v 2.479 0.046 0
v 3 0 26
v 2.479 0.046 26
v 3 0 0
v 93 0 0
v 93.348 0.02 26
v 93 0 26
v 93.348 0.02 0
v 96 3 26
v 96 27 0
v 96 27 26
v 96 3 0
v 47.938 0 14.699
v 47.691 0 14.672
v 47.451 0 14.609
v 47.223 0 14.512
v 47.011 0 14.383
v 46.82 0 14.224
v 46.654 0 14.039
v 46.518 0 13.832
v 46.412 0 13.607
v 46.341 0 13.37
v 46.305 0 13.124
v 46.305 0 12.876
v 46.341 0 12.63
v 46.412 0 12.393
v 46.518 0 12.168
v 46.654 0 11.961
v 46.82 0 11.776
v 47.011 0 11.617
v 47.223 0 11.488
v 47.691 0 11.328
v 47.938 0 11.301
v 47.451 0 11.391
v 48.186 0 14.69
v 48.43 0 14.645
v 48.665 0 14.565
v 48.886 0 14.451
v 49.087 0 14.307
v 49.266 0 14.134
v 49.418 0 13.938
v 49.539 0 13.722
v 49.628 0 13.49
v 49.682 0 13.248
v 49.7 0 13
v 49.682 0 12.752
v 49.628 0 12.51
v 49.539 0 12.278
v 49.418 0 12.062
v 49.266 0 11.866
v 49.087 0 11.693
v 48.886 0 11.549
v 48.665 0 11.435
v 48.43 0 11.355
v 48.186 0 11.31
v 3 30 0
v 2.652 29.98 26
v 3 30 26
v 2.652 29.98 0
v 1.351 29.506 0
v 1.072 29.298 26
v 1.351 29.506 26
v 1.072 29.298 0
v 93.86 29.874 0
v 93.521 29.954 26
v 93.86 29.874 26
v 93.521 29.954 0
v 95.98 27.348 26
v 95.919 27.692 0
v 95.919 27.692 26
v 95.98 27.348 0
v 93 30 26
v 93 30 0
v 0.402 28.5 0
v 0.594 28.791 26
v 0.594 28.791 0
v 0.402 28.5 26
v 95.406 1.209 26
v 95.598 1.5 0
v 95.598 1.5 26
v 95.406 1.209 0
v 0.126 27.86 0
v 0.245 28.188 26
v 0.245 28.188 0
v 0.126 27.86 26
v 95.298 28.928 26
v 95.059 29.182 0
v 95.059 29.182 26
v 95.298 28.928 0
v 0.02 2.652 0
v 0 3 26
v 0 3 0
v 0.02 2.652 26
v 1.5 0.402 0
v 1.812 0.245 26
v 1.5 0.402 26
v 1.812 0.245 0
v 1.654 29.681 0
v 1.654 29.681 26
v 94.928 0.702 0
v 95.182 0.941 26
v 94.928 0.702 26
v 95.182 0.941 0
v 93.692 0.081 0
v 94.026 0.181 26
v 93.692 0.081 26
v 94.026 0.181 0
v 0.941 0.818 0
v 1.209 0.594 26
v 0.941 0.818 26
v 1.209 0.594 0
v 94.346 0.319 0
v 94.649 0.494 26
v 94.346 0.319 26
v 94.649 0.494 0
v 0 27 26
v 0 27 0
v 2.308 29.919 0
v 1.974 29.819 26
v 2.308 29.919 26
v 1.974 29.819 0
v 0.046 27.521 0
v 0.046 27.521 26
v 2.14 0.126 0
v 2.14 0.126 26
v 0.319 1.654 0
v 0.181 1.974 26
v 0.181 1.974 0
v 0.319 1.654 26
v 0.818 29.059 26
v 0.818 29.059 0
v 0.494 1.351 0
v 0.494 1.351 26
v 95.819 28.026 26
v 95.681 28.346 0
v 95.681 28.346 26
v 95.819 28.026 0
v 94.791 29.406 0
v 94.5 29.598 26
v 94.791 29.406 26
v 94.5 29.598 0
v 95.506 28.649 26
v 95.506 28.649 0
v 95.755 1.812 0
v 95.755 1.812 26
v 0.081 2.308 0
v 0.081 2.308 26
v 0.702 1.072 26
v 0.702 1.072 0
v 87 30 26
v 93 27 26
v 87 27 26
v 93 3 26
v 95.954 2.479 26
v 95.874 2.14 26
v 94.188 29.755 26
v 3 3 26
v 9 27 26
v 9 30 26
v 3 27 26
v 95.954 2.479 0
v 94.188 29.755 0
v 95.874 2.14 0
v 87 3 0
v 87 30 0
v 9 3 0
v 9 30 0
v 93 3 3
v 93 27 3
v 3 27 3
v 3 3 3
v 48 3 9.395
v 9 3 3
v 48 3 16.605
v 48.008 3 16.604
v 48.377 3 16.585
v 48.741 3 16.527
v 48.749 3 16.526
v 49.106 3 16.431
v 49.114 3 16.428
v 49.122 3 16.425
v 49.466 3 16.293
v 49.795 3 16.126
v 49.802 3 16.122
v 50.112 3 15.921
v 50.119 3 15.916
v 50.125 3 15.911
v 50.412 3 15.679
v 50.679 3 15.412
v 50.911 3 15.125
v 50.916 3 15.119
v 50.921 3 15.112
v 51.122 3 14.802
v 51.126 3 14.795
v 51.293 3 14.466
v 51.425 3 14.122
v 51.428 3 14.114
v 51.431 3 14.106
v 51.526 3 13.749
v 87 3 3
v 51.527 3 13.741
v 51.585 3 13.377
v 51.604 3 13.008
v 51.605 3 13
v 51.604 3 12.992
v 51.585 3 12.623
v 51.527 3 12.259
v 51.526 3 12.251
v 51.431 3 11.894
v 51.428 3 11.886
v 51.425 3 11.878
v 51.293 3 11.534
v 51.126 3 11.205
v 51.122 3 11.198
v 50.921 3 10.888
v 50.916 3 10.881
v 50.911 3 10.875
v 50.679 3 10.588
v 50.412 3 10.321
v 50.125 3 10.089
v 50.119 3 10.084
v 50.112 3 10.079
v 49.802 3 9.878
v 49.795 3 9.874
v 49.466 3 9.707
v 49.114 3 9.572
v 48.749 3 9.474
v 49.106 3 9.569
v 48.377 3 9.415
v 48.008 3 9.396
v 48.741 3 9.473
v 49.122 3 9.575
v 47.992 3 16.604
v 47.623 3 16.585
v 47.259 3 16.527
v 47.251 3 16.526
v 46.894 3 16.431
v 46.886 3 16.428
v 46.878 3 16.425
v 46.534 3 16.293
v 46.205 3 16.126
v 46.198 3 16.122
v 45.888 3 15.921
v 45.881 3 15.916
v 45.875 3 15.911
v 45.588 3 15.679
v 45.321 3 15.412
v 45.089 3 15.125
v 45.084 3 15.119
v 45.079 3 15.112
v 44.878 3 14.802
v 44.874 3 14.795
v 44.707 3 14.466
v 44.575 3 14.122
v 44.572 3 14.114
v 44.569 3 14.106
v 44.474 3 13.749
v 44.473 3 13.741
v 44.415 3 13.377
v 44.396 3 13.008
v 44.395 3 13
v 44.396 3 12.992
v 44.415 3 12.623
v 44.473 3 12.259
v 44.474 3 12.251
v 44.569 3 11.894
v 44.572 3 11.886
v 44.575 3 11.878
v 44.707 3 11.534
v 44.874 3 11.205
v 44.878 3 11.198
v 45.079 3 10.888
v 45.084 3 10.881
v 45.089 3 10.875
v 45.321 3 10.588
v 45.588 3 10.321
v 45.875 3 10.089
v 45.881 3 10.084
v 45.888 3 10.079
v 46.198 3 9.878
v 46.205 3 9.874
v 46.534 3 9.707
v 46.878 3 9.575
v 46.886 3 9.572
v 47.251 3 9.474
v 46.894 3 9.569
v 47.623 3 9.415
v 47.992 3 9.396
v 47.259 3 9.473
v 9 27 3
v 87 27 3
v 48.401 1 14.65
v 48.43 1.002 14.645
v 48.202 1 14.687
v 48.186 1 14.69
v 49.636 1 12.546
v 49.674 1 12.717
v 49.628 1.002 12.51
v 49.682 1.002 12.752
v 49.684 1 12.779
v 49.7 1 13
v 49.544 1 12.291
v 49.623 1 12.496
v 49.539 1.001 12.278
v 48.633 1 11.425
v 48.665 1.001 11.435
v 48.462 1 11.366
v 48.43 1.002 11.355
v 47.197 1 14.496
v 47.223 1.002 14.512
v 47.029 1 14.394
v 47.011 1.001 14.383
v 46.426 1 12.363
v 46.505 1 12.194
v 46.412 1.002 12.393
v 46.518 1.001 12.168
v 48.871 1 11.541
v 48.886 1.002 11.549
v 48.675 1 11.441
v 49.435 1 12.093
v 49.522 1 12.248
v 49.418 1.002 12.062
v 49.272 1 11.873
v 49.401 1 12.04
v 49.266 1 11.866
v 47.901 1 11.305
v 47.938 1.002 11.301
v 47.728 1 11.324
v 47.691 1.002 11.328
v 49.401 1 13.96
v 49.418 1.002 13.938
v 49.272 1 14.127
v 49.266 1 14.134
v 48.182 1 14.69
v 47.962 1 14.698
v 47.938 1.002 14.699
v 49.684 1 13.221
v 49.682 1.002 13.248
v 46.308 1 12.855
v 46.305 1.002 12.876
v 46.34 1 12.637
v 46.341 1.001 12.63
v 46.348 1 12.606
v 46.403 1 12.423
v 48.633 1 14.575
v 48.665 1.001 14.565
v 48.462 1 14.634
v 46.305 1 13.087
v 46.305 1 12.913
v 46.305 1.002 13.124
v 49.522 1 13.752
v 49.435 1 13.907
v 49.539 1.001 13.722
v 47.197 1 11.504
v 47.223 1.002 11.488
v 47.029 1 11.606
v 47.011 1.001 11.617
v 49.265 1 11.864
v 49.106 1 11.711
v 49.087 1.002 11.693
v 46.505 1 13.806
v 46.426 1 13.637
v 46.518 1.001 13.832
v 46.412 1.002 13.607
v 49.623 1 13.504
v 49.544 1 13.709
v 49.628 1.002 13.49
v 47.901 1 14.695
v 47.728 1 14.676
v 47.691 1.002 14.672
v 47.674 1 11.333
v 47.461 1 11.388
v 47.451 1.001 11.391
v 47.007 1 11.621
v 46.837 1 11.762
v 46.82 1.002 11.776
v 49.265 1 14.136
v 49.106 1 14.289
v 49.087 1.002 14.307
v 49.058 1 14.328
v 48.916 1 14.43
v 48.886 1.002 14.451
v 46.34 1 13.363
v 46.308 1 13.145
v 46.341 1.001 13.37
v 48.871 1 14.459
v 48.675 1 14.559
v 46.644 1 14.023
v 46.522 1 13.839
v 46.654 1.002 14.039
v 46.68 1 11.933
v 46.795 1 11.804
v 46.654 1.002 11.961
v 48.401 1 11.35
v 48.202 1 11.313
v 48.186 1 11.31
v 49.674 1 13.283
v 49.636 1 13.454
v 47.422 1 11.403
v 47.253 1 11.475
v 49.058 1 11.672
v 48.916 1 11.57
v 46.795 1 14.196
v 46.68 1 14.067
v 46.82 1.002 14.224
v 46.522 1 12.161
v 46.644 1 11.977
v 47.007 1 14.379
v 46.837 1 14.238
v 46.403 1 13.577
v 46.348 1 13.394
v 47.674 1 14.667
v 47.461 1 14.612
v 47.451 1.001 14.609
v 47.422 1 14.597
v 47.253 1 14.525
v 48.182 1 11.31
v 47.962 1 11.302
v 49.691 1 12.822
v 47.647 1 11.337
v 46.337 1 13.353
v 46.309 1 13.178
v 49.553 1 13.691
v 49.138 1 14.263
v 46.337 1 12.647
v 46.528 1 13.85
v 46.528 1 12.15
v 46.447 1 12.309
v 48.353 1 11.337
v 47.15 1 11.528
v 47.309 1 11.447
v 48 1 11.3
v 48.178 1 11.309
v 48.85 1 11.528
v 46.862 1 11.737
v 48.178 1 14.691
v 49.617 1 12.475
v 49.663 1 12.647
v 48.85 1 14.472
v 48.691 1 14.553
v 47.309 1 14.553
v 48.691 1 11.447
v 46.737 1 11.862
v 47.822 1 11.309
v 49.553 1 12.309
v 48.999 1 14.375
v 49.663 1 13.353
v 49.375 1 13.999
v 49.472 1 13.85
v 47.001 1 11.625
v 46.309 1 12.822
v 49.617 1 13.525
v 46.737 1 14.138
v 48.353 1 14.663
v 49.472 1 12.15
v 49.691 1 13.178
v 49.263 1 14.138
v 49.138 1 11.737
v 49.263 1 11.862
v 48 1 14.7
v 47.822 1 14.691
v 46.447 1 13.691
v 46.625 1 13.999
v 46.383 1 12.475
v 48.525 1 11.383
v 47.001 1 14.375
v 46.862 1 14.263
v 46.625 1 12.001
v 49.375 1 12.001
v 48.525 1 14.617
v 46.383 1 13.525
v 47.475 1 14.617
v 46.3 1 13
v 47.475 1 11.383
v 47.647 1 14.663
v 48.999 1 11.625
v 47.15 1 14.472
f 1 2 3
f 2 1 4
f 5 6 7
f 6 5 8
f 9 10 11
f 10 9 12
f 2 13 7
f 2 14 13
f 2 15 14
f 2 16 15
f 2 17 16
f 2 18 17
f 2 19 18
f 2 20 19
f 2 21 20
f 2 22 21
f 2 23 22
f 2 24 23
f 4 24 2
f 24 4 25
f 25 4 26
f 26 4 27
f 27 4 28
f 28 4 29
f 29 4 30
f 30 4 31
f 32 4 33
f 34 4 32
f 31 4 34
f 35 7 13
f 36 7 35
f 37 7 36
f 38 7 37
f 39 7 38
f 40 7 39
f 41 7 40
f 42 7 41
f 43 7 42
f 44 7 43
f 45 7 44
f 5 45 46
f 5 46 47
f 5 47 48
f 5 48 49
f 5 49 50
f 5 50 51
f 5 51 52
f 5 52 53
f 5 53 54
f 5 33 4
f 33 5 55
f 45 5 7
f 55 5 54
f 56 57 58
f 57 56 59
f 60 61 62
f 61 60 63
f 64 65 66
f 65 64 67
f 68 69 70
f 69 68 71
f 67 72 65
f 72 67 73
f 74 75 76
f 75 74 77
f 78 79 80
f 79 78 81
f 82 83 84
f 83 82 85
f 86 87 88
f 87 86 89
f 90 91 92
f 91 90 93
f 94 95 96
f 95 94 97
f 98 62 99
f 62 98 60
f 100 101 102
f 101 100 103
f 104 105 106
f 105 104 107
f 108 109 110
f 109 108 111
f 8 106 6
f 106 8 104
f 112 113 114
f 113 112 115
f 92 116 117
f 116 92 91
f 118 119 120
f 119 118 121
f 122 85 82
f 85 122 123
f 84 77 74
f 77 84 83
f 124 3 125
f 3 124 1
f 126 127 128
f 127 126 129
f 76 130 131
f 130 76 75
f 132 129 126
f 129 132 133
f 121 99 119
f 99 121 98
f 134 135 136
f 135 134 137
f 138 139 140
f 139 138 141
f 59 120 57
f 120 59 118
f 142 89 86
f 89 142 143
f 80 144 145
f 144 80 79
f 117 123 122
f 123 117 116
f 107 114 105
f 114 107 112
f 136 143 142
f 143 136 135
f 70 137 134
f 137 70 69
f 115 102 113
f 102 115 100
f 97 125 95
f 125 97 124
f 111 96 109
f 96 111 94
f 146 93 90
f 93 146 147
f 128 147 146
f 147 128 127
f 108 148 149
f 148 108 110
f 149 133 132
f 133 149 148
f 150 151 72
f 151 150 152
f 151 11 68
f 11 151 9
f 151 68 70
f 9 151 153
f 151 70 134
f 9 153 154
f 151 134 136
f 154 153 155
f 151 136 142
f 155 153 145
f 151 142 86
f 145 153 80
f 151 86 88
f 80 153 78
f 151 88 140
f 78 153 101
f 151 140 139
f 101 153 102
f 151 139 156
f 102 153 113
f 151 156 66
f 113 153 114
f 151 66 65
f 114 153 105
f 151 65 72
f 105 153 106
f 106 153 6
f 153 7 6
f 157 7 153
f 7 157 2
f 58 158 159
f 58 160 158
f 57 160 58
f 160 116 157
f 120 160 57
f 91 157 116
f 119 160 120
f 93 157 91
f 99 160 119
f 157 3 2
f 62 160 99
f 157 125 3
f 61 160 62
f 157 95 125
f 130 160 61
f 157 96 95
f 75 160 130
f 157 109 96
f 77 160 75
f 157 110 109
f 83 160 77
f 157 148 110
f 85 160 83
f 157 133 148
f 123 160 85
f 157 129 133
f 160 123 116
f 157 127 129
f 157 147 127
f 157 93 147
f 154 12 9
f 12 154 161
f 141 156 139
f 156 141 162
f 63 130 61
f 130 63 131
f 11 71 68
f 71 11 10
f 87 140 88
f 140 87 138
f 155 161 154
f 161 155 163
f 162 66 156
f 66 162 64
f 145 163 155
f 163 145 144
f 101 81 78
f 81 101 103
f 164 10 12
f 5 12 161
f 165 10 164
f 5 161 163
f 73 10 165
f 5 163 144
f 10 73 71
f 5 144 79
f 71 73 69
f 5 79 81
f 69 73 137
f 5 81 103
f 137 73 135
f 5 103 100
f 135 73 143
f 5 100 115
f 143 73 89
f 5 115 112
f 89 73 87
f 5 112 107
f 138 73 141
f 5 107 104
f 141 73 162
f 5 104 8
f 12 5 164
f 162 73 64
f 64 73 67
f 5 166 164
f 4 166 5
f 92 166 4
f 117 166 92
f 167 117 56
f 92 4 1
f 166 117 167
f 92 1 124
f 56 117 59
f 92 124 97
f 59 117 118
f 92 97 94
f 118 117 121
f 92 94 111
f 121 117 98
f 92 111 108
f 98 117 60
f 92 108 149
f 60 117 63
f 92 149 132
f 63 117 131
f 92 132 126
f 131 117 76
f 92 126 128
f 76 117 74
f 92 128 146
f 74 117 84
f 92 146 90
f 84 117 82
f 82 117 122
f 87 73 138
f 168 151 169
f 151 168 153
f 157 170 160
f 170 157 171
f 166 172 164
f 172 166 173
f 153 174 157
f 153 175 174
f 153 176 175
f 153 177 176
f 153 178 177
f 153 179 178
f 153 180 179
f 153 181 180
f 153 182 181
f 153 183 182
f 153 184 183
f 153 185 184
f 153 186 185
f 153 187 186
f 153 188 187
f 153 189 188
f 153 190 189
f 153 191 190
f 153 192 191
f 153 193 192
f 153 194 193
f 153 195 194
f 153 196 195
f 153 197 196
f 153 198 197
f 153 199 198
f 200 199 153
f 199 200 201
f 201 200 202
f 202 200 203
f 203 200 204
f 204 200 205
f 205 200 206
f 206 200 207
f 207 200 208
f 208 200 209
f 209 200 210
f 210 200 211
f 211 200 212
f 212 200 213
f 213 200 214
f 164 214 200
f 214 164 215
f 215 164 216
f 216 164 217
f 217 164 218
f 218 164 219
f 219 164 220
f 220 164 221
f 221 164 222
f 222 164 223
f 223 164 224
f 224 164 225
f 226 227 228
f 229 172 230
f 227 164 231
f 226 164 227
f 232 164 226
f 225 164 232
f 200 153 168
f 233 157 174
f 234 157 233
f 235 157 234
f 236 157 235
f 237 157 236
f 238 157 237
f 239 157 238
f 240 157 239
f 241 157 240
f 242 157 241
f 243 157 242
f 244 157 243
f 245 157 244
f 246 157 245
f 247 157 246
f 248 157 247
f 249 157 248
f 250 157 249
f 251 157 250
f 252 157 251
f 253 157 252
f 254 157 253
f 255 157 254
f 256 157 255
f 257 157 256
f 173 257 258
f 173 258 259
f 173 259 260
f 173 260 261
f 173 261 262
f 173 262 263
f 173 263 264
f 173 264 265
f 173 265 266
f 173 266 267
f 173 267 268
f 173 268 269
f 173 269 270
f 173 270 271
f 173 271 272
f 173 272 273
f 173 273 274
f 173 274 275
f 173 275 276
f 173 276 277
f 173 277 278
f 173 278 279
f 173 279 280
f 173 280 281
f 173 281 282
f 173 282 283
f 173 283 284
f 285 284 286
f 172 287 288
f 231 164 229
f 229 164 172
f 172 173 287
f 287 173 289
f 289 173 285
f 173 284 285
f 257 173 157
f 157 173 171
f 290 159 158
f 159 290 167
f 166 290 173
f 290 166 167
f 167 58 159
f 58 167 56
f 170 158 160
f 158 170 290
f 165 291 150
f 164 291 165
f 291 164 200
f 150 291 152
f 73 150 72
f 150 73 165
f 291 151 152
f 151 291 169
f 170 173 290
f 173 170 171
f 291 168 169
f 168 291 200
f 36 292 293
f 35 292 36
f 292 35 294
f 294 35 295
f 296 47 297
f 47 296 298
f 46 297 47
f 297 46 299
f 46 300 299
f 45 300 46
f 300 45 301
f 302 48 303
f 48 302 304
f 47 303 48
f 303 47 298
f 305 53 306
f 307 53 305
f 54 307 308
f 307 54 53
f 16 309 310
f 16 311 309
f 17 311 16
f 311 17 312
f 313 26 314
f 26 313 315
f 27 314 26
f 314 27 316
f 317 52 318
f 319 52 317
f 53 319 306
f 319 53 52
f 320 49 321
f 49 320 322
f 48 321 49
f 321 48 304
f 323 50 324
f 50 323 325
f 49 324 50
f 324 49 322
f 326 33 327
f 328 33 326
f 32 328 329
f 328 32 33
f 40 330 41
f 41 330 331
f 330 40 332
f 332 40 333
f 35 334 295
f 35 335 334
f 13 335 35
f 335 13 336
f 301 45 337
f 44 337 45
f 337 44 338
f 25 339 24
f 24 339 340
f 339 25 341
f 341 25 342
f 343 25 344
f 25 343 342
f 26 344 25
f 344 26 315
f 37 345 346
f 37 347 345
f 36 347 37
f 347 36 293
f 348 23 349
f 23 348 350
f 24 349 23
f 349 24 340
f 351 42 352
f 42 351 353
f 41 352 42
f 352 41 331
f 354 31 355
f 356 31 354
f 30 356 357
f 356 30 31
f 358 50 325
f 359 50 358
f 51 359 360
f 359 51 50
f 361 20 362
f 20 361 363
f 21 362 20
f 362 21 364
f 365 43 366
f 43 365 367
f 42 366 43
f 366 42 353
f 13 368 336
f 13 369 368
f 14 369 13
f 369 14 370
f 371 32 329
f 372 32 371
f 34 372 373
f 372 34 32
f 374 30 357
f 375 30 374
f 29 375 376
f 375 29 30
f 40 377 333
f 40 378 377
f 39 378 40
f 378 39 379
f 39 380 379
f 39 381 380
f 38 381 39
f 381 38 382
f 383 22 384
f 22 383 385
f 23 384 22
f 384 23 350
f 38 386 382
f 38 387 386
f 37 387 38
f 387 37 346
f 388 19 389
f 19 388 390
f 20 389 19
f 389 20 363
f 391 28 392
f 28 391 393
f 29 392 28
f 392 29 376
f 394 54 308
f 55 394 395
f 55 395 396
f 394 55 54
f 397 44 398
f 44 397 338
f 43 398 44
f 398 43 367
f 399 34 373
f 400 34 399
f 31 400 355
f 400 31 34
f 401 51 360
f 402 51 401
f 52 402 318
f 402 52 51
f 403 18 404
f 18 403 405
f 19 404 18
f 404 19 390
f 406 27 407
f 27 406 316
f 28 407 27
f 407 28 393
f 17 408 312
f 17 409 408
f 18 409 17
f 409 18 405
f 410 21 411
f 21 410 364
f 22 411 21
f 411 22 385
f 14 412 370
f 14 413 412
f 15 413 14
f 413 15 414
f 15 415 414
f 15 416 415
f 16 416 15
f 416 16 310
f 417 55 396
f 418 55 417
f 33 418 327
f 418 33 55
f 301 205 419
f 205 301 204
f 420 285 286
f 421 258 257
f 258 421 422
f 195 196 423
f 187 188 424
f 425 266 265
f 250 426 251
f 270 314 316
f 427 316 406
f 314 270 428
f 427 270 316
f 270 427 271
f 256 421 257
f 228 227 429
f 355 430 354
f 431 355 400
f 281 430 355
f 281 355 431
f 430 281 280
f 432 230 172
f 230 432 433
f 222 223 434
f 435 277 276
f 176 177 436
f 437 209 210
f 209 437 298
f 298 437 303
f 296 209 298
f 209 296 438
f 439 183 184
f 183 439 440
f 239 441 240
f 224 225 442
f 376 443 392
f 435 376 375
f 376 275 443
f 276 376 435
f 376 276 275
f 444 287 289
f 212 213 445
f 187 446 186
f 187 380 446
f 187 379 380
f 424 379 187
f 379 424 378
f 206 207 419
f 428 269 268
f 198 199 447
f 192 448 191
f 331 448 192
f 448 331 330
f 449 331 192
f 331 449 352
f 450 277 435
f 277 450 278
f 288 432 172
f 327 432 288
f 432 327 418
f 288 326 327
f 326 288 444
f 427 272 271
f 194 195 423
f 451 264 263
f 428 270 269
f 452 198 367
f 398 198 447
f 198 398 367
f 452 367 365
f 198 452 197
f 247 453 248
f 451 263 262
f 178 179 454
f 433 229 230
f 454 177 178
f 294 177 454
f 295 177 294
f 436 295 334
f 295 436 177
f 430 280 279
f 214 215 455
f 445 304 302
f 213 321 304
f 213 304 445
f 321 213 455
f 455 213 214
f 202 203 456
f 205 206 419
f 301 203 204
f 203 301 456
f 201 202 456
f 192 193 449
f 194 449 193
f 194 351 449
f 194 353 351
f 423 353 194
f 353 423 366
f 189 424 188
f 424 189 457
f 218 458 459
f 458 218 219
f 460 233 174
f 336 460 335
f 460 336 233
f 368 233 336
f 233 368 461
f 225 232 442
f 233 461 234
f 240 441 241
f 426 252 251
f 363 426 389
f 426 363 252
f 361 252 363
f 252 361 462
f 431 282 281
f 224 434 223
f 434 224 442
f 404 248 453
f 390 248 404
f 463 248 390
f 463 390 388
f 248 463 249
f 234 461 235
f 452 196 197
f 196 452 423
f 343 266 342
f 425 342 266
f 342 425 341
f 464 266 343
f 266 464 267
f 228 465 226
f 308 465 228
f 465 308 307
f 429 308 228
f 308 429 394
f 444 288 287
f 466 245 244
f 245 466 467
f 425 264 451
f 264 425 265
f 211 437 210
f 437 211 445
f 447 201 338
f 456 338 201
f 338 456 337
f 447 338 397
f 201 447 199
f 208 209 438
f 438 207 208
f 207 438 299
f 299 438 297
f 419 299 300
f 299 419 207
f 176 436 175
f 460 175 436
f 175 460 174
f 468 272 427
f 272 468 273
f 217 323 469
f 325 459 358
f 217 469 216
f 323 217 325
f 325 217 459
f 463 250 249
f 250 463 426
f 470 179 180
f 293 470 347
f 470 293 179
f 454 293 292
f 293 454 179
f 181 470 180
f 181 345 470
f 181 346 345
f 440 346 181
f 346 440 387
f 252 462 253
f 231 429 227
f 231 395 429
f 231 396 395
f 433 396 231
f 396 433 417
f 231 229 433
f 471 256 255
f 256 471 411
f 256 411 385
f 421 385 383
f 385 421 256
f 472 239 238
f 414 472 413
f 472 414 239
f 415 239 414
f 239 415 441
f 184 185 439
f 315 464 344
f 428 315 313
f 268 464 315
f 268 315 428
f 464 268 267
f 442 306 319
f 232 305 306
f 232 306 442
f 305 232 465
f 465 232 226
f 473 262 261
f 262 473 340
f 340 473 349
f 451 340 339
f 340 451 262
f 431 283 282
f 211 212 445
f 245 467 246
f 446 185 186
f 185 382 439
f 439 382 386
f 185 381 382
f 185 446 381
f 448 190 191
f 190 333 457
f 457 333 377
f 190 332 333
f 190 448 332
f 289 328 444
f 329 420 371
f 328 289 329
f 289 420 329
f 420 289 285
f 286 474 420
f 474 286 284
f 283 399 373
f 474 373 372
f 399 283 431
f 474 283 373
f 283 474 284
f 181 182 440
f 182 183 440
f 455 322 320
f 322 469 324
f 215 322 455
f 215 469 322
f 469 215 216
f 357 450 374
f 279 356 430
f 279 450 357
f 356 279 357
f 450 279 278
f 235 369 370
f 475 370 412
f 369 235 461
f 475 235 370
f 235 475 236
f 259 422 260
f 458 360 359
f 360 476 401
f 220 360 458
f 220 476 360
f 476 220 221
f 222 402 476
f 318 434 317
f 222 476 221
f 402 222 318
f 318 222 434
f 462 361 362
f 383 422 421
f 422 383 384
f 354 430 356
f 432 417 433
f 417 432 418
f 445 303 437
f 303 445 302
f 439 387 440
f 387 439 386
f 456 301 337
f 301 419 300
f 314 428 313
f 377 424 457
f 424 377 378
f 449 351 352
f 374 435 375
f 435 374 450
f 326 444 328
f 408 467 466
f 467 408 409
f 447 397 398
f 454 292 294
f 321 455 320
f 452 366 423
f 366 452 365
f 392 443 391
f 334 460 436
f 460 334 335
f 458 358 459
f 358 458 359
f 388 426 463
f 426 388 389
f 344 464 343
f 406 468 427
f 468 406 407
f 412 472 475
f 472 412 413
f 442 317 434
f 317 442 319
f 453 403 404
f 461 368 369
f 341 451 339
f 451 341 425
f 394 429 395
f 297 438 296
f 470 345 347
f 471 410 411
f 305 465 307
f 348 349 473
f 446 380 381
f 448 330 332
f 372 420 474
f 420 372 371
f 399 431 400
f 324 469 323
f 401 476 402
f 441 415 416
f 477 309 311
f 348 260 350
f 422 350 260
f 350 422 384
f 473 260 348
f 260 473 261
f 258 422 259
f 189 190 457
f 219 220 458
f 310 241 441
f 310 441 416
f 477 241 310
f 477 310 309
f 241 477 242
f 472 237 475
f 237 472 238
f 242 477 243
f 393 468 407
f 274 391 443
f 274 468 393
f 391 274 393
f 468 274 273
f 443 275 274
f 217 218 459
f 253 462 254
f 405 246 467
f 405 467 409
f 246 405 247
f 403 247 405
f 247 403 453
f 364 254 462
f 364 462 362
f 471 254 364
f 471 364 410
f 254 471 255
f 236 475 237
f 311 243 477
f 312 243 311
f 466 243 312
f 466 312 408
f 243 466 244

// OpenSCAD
// OpenSCAD: LAN switch wall holder — open-top U-cradle
// Version: v1.0 — initial parametric model

use <../modules.scad>;

description = "Wall U-cradle for LAN switch (D-Link DGS-1005A), 90x23 pocket, 30 mm deep";
version_str = "1.0";

// ===== Точность аппроксимации окружностей =====
$fn = 0;
$fa = 6;
$fs = 0.35;
pin_fs = 0.25;

// ===== Режим печати тест‑фрагментов =====
test_fragment = false;
frag_size = 20;
frag_index = 0;
frag_gap_x = 10;
frag_h_extra = 20;

// ===== Общие доп. параметры =====
tiny = 0.1;
edge_chamfer_z = 1;
edge_chamfer_x = 5;
edge_chamfer_y = 5;
screen_frame_gap = 0.2;

// ===== Параметры модели =====
inner_w = 90;           // внутренняя ширина по X, мм
inner_h = 23;           // внутренняя высота кармана по Z, мм
depth_y = 30;           // глубина люльки по Y, мм
wall_th = 3;            // толщина стенок и дна, мм

lapka_out = 6;          // выступ лапок внутрь по X — одинаковый у передних и боковых, мм

screw_d = 3;            // диаметр отверстия под винт, мм
screw_head_d = 7;       // диаметр разверстия под головку, мм
screw_head_depth = 2;   // глубина разверстия под головку, мм
screw_clearance = 0.4;  // запас на отверстие, мм

corner_r = 3;           // скругление внешних вертикальных рёбер, мм

// ===== Комментарии ===========================
/*
Модель: настенный держатель коммутатора. Коммутатор вкладывается сверху внутрь
и обхватывается передними лапками.
Целевое устройство: D-Link DGS-1005A (5-port Gigabit Unmanaged Desktop Switch),
габариты корпуса 94 x 75 x 22.45 мм (datasheet) — посадка подтверждена натурно.
Оси: X — ширина, Y — глубина (от стены), Z — высота.
Дно (часть с отверстием) — пластина в плоскости XZ при Y=0, прилегает к стене.
Origin: нижний левый угол дна.

Фрагменты:
- bottom_plate — дно с центральным отверстием под винт (плоскость XZ, Y=0)
- left_wall, right_wall — боковые стенки на всю глубину
- left_lapka, right_lapka — передние обхватывающие лапки (плоскость параллельна дну, Y=depth)
- left_rail, right_rail — нижние опорные рельсы (вторые лапки), на них ложится коммутатор
- mount_hole — центральное крепление (Ø3 + коническая зенковка Ø7×2)
- holder — полная сборка
*/

// ===== Вычисляемые размеры =====
outer_x = inner_w + 2 * wall_th;   // 96
outer_z = inner_h + wall_th;       // 26 (дно + карман)

base_L = outer_x;                  // для clip_for_fragments
base_W = depth_y;
base_h = outer_z;

mount_x = outer_x / 2;             // центр по X
mount_z = outer_z / 2;            // центр по Z

// ===== Вспомогательные модули ====================
// Сквозное отверстие под винт с разверстием под головку, ось вдоль +Y.
module mount_hole() {
  translate([mount_x, 0, mount_z])
    rotate([-90, 0, 0]) {
      // сквозное отверстие
      translate([0, 0, -tiny])
        cylinder(h = wall_th + 2 * tiny, d = screw_d + screw_clearance, $fs = pin_fs, $fa = 6);
      // зенковка под головку: плавное сужение Ø_head -> Ø_screw, открыта внутрь кармана
      translate([0, 0, wall_th - screw_head_depth])
        cylinder(
          h = screw_head_depth + tiny,
          d1 = screw_d + screw_clearance,
          d2 = screw_head_d + screw_clearance,
          $fs = pin_fs,
          $fa = 6
        );
    }
}

// ===== Модули деталей ====================
// Внешний скруглённый объём люльки (footprint скруглён по углам, выдавлен по Z).
module outer_block() {
  linear_extrude(height = outer_z)
    rounded_rect(size = [outer_x, depth_y], r = corner_r);
}

// Вырез кармана: открыт сверху, спереди и снизу, оставляет дно (пластину при Y=0).
module cavity_cut() {
  translate([wall_th, wall_th, -tiny])
    cube([inner_w, depth_y, inner_h + outer_z]);
}

// Дно — пластина с отверстием (часть outer_block при y in [0, wall_th]).
module bottom_plate() {
  intersection() {
    outer_block();
    cube([outer_x, wall_th, outer_z]);
  }
}

module left_wall() {
  intersection() {
    outer_block();
    cube([wall_th, depth_y, outer_z]);
  }
}

module right_wall() {
  intersection() {
    outer_block();
    translate([outer_x - wall_th, 0, 0]) cube([wall_th, depth_y, outer_z]);
  }
}

// Передние (верхние) обхватывающие лапки: во фронтальной плоскости (параллельной дну),
// на всю высоту базы (по Z), выступают внутрь на lapka_out и держат коммутатор от выпадения.
module left_lapka() {
  translate([wall_th, depth_y - wall_th, 0])
    cube([lapka_out, wall_th, outer_z]);
}

module right_lapka() {
  translate([outer_x - wall_th - lapka_out, depth_y - wall_th, 0])
    cube([lapka_out, wall_th, outer_z]);
}

// Боковые (нижние) опорные лапки‑рельсы: на всю глубину базы (по Y), на уровне дна,
// тот же выступ внутрь lapka_out.
module left_rail() {
  translate([wall_th, 0, 0])
    cube([lapka_out, depth_y, wall_th]);
}

module right_rail() {
  translate([outer_x - wall_th - lapka_out, 0, 0])
    cube([lapka_out, depth_y, wall_th]);
}

module holder() {
  difference() {
    union() {
      // каркас = внешний объём минус карман (остаются дно + боковые стенки)
      difference() {
        outer_block();
        cavity_cut();
      }
      left_lapka();
      right_lapka();
      left_rail();
      right_rail();
    }
    mount_hole();
  }
}

// ===== Вывод всех фрагментов ====================
module show_all() {
  clip_for_fragments() {
    holder();
  }
}

// ===== Точка входа ====================
show_all();
